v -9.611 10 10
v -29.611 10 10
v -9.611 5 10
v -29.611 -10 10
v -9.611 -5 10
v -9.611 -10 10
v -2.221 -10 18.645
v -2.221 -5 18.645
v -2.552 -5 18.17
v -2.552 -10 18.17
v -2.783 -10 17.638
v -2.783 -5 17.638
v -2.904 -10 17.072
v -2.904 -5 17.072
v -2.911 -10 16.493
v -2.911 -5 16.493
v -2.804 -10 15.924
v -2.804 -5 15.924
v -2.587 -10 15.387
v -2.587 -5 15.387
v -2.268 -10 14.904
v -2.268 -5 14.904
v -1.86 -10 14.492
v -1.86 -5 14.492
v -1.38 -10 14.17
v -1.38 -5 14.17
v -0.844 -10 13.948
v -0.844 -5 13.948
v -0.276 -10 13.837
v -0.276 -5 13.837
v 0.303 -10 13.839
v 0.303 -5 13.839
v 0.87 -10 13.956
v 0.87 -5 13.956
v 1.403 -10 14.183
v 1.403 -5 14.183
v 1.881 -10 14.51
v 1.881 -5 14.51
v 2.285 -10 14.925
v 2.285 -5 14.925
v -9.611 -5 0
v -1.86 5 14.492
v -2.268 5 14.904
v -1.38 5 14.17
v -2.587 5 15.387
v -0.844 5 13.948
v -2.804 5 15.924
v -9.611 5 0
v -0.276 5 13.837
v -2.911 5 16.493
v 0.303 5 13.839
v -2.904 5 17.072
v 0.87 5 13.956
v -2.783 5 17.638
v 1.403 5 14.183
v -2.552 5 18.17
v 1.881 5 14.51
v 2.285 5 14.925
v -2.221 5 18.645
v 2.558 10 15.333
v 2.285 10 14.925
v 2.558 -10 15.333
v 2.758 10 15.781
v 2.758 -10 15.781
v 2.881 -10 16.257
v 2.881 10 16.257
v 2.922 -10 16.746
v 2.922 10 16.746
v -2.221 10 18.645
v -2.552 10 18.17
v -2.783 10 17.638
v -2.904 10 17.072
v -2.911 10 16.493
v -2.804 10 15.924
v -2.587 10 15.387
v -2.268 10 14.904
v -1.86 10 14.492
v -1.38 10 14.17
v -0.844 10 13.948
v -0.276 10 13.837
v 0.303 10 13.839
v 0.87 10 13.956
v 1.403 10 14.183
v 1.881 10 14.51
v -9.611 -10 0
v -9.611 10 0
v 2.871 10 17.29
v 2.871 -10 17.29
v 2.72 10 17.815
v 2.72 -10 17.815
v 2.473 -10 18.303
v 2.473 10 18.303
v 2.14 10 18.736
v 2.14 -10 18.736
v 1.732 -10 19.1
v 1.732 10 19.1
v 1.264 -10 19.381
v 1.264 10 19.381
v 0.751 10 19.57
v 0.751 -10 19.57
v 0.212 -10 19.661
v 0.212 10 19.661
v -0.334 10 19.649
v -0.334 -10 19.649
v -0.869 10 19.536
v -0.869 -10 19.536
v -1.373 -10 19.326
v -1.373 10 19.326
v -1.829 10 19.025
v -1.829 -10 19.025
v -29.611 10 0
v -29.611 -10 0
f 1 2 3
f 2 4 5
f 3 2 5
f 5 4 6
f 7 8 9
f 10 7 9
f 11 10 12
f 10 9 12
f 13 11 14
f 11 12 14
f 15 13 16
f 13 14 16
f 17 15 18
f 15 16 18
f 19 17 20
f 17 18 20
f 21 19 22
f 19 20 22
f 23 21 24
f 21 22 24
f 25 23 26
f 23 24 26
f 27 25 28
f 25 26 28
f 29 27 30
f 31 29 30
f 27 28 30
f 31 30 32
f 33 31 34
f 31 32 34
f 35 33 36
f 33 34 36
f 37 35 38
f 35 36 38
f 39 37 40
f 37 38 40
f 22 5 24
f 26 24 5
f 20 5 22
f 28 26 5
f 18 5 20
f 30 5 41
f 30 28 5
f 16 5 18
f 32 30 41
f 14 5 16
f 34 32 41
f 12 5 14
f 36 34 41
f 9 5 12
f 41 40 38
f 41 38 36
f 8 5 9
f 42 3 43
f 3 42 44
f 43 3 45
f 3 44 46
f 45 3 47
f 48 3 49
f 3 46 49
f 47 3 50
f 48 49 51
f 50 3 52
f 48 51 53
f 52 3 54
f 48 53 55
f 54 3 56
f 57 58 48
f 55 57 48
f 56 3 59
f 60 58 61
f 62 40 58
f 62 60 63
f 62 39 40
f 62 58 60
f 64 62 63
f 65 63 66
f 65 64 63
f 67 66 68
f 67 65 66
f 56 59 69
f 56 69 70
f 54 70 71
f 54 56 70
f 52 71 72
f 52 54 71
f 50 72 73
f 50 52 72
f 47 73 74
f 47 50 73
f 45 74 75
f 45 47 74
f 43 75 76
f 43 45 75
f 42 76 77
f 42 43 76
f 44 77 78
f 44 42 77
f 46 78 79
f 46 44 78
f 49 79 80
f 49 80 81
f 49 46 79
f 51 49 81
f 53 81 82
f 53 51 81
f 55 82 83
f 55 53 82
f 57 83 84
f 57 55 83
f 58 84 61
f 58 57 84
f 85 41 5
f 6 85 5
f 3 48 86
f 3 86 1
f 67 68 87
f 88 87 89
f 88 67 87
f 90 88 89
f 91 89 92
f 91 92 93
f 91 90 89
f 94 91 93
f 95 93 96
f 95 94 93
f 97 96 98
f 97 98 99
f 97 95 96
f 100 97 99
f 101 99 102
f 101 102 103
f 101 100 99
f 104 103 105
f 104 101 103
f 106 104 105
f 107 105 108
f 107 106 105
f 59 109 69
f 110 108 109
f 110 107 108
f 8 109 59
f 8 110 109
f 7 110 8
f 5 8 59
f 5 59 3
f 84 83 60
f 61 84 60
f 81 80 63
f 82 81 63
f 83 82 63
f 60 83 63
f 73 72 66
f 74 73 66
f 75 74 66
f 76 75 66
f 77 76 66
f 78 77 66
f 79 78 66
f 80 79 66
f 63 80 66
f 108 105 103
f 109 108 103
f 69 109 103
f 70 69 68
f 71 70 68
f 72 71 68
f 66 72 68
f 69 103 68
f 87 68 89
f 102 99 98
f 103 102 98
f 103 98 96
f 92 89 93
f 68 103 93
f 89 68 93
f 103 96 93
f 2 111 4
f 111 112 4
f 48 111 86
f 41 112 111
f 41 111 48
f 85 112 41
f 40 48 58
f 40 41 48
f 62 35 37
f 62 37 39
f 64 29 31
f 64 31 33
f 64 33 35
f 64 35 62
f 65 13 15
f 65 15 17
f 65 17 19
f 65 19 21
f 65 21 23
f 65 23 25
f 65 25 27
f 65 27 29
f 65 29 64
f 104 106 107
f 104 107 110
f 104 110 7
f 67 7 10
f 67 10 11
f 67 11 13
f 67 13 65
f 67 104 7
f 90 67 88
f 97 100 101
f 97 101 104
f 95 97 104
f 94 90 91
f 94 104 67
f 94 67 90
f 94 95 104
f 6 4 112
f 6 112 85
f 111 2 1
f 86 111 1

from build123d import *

# Parameters (mm, degrees)
F0_W     = 20
F0_H     = 10
F1_DEPTH = 10
F2_DEPTH = 5


with BuildPart() as f1:
    # F0 (on Front) → F1 (new body)
    with BuildSketch(Plane.XZ):
        with BuildLine():
            ThreePointArc((-2.221403, 18.644934), (-1.860462, 14.492448), (2.285223, 14.924558))
            ThreePointArc((2.285223, 14.924558), (2.758486, 15.781217), (2.922367, 16.746093))
            ThreePointArc((2.922367, 16.746093), (1.012046, 19.487624), (-2.221403, 18.644934))
        make_face()
        with Locations((-19.611036, 5)):
            Rectangle(F0_W, F0_H)
    extrude(amount=F1_DEPTH)



with BuildPart() as f2:
    # F0 (on Front) → F2 (new body)
    with BuildSketch(Plane.XZ):
        with BuildLine():
            Line((-9.611036, 10), (-9.611036, 0))
            Line((-9.611036, 0), (2.285223, 14.924558))
            ThreePointArc((2.285223, 14.924558), (-1.860462, 14.492448), (-2.221403, 18.644934))
            Line((-2.221403, 18.644934), (-9.611036, 10))
        make_face()
    extrude(amount=F2_DEPTH)


with BuildPart() as f1_1:
    add(f1.part)

    add(f2.part)  # F3 merges F2
    # F3: F1 across plane


with BuildPart() as f1_2:
    add(f1_1.part)
    add(f1_1.part.mirror(Plane.XZ))


solid = f1_2.part
